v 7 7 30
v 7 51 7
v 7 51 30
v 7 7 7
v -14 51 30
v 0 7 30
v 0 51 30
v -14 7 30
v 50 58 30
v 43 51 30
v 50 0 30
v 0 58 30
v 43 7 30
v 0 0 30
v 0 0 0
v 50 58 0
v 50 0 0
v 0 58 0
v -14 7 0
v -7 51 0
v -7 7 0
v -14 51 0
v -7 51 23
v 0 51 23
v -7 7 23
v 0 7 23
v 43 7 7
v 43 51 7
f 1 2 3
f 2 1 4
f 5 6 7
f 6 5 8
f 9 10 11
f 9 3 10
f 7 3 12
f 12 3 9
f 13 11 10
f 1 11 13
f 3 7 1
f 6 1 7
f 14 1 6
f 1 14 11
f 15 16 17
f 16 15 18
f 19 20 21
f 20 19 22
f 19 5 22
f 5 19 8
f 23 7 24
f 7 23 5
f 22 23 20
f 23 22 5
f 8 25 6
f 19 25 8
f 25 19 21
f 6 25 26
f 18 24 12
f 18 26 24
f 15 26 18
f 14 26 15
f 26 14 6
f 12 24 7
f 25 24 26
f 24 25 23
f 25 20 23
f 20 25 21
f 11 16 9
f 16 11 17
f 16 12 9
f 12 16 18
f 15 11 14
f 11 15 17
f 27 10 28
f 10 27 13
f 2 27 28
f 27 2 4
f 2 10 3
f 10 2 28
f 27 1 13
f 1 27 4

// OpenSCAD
spielraum = 2;
wanddicke = 7;
wanddicke_vogelhaus = 7;

hook_x = wanddicke_vogelhaus + 2*wanddicke;
hook_y = 46 - spielraum;
hook_z = 30;

hookinner_x = wanddicke_vogelhaus;
hookinner_y = hook_y + 2*spielraum;
hookinner_z = hook_z - wanddicke + spielraum;

box_x = 50;
box_y = hook_y + 2*wanddicke;
box_z = 30;

boxinner_x = box_x - 2* wanddicke;
boxinner_y = box_y - 2*wanddicke;
boxinner_z = box_z - wanddicke + spielraum;


color("#00ff00") union() {      // verbindet Box mit Hook
    translate ([-(wanddicke + wanddicke_vogelhaus), wanddicke, 0]) difference() {   // zieht inneren Hook von Hook ab

        cube([hook_x, hook_y, hook_z]); //äußere Kanten Hook

        translate([wanddicke, -spielraum, -spielraum]) color("#ff0000") cube ([hookinner_x, hookinner_y, hookinner_z]); // innere Kanten Hook
    }

    difference() {  //zieht innere Box von Box ab
        cube([box_x, box_y, box_z]);    //äußere Kanten Box

        translate([wanddicke, wanddicke, wanddicke]) color("#ff0000") cube([boxinner_x, boxinner_y, boxinner_z]);    // innere Kanten Box
    }
}


// translate([-150, -spielraum/2, -10]) color("#0000ff") cube([150,60,40]);
